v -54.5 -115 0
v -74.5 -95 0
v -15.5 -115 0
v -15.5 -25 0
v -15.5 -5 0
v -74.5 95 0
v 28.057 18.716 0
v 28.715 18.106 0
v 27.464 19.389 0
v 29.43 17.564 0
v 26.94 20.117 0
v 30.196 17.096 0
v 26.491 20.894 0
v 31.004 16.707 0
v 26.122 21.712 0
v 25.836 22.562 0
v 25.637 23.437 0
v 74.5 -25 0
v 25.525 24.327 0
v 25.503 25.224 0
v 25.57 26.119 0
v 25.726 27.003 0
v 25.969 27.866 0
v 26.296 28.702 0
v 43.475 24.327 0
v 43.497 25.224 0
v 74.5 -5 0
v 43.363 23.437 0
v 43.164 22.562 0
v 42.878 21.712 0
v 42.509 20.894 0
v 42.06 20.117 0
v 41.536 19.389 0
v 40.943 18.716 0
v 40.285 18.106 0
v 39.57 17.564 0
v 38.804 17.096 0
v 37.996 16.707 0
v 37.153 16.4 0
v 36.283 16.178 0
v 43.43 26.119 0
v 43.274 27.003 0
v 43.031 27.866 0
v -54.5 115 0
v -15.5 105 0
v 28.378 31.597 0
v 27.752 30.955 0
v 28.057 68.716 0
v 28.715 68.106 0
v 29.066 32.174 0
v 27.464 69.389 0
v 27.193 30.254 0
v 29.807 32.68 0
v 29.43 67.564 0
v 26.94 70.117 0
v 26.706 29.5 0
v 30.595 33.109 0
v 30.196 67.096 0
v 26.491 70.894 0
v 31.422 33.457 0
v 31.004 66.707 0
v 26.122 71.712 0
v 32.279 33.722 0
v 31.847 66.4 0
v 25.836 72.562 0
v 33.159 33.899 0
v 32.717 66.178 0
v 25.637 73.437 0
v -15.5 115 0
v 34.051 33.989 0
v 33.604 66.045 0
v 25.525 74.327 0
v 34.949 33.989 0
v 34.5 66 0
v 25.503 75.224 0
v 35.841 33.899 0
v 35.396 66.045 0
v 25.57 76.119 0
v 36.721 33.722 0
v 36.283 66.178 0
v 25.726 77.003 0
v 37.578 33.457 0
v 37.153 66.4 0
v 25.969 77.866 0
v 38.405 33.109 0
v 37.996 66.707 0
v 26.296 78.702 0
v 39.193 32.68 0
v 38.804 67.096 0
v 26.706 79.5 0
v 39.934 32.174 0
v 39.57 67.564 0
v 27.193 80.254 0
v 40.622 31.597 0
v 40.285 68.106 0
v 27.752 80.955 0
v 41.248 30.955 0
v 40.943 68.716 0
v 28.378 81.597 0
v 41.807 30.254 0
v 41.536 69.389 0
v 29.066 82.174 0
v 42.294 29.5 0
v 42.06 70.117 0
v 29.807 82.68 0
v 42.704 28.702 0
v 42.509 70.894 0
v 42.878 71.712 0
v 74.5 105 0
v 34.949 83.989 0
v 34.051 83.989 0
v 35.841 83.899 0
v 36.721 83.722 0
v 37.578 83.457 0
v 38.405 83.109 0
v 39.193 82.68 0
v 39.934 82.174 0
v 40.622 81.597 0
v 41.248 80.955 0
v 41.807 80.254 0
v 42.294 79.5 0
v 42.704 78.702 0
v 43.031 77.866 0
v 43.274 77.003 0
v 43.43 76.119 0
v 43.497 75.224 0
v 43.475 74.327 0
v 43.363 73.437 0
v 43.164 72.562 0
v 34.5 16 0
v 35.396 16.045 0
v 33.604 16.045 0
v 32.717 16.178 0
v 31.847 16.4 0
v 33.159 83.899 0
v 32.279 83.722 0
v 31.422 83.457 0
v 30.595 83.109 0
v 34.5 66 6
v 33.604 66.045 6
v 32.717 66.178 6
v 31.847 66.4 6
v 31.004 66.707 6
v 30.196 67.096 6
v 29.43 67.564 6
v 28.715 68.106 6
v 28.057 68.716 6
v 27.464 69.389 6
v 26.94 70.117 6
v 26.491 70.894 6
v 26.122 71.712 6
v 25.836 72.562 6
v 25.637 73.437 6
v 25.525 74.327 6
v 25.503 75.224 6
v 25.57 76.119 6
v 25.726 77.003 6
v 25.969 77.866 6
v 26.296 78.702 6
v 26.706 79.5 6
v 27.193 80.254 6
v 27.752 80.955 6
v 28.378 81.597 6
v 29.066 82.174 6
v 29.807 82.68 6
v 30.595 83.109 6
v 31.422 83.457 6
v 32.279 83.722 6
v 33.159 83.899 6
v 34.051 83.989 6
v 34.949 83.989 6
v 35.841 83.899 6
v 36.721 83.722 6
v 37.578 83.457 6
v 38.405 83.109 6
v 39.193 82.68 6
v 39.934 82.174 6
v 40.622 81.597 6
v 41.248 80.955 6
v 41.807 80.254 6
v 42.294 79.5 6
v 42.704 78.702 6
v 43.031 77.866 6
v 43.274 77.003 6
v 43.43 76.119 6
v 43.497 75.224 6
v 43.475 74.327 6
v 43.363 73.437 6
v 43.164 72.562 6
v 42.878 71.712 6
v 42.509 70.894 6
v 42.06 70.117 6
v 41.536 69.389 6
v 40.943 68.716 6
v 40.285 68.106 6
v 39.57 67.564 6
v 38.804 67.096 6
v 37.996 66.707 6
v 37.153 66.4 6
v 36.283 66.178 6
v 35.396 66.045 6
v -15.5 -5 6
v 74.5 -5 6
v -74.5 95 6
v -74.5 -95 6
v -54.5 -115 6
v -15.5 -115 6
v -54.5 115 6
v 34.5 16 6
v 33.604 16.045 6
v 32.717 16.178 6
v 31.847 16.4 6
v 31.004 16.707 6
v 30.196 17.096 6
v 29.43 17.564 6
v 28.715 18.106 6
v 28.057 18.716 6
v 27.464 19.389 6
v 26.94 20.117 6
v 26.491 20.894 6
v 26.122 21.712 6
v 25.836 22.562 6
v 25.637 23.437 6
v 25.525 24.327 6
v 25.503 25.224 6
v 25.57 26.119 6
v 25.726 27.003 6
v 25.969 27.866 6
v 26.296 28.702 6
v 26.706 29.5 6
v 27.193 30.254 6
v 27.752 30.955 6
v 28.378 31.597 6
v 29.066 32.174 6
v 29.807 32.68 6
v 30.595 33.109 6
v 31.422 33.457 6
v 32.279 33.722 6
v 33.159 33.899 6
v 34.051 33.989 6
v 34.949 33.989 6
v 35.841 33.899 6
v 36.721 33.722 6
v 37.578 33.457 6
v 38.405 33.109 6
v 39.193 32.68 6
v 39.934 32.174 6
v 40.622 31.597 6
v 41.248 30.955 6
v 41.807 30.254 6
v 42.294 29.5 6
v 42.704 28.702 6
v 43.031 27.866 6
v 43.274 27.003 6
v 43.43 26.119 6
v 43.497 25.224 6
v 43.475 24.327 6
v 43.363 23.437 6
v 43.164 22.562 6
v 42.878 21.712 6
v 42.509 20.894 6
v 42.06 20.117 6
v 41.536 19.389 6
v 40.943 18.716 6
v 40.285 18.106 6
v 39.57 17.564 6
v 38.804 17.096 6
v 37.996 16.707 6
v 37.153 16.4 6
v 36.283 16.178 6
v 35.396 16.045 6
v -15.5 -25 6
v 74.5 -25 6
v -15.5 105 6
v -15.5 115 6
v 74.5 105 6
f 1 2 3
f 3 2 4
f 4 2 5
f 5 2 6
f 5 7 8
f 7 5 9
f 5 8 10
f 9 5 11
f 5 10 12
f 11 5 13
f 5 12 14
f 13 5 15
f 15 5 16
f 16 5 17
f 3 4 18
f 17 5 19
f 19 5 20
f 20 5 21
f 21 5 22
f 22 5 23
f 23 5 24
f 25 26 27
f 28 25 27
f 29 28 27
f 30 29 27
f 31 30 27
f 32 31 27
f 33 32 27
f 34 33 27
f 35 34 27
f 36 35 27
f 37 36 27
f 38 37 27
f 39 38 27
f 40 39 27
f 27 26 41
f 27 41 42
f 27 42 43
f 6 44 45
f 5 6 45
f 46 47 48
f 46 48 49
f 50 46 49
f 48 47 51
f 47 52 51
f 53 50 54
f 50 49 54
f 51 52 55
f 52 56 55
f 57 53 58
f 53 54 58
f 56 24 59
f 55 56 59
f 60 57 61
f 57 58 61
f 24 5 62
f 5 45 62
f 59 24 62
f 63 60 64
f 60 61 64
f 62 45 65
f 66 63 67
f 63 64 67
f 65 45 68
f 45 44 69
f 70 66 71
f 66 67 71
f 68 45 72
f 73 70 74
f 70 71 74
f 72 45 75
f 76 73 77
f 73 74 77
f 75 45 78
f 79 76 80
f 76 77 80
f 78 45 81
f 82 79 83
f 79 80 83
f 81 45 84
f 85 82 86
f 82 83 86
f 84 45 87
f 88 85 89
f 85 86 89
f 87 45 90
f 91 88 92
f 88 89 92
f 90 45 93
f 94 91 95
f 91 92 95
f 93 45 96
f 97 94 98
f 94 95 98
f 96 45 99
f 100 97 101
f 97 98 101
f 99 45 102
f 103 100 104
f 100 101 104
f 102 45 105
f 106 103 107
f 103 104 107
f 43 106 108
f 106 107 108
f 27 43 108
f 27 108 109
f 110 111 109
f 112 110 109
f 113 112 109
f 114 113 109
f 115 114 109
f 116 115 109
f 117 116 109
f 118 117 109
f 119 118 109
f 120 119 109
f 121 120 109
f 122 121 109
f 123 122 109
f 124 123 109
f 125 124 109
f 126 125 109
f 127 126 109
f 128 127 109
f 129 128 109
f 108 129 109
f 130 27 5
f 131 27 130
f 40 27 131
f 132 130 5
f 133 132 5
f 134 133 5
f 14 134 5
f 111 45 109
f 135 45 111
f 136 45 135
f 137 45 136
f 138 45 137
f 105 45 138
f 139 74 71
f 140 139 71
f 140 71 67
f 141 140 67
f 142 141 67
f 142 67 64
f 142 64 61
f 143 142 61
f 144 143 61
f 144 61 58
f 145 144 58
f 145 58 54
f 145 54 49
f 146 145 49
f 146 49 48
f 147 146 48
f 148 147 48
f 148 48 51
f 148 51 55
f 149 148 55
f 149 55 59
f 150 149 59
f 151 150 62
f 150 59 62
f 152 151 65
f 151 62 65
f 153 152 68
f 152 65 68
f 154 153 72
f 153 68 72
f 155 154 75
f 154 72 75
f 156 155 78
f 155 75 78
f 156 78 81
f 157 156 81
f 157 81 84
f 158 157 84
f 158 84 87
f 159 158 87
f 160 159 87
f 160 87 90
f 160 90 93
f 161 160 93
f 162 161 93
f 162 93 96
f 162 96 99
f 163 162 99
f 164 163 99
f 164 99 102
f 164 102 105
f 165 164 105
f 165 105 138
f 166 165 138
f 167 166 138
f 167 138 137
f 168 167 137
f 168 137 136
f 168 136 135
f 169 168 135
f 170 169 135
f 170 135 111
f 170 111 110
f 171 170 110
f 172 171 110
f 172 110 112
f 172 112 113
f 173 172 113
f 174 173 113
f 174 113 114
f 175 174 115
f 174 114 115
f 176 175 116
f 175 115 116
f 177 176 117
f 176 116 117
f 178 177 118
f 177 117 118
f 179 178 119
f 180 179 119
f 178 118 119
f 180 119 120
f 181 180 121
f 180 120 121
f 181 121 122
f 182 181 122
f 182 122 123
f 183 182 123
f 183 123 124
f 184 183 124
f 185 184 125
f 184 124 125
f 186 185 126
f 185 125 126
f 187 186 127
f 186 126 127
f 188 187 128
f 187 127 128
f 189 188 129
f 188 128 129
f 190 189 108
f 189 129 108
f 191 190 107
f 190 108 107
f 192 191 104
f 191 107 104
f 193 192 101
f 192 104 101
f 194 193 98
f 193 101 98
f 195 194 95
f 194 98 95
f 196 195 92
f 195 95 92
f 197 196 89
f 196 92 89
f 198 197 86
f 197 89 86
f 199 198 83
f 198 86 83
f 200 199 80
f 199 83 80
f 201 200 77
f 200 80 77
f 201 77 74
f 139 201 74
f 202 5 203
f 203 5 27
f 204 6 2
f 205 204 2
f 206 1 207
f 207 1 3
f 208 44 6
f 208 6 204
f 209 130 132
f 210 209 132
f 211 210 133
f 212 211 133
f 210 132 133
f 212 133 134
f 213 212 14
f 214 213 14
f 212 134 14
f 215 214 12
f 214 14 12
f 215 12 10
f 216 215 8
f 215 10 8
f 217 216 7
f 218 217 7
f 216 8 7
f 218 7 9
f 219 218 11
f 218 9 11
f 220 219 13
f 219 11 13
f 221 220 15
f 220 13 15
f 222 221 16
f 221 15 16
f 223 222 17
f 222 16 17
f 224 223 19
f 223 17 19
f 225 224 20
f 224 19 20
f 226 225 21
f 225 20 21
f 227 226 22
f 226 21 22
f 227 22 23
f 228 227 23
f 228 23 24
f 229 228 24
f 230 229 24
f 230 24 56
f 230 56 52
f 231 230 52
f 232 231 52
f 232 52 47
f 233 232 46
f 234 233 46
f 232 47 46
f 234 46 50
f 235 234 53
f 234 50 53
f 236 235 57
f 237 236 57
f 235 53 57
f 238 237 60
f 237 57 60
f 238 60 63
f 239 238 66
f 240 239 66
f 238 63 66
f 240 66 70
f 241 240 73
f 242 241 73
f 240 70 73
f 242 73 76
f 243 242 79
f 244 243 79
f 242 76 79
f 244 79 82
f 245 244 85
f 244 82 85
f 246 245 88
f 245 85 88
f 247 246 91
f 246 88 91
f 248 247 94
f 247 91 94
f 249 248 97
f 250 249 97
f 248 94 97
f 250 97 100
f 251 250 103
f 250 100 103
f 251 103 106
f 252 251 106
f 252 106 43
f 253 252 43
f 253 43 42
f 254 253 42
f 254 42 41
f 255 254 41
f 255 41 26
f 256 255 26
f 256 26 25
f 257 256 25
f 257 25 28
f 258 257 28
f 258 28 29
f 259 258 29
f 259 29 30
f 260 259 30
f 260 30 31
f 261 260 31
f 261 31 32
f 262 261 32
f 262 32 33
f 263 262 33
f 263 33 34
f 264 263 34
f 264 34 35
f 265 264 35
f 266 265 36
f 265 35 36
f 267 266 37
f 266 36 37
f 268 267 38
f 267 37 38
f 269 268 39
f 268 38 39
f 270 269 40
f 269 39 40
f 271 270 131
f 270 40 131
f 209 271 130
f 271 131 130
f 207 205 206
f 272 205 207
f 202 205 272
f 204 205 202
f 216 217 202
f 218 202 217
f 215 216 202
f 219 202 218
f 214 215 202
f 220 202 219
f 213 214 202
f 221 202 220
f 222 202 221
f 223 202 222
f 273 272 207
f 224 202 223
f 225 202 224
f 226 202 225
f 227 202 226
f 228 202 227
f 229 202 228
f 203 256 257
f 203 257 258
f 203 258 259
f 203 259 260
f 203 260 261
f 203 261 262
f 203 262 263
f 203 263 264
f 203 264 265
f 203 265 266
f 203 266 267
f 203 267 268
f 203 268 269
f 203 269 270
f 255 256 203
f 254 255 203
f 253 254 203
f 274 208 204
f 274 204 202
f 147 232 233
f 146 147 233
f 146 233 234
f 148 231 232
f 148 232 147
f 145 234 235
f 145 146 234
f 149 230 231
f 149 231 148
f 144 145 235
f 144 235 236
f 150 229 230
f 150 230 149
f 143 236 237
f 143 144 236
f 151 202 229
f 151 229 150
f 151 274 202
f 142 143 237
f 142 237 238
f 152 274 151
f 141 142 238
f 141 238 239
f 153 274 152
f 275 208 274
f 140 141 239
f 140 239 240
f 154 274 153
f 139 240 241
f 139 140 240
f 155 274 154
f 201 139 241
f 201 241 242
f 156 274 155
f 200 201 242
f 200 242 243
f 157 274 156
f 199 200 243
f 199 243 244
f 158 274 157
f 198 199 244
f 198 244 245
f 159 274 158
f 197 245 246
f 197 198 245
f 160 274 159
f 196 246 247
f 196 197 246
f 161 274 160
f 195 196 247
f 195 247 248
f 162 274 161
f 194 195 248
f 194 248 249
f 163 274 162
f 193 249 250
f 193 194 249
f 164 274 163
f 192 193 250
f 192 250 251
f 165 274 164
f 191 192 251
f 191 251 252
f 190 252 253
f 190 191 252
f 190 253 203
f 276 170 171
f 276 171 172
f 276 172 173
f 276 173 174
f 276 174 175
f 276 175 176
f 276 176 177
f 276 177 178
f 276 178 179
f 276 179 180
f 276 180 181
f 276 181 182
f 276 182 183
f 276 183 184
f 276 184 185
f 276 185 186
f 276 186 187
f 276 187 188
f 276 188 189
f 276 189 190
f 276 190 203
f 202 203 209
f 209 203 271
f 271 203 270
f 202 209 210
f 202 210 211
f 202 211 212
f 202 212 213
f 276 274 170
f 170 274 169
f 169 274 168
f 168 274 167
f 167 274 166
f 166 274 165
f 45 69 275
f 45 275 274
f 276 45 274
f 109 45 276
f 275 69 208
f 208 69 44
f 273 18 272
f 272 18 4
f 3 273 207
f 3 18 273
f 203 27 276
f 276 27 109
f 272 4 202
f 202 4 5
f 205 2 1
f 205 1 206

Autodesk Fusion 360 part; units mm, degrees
sketch "スケッチ1" plane through (0, 0, 0) normal (0, 0, 1) x (1, 0, 0)
  line L0 (-15.5, 115) -> (-74.5, 115)
  line L1 (-74.5, 115) -> (-74.5, -115)
  line L2 (-74.5, -115) -> (-15.5, -115)
  line L3 (74.5, -5) -> (74.5, 105)
  line L4 (68.0217, 105) -> (-74.5, -115) construction
  line L5 (-74.5, 115) -> (39.1174, -60.3826) construction
  line L6 (-15.5, 115) -> (-15.5, 105)
  line L7 (-15.5, 105) -> (74.5, 105)
  line L8 (-74.5, -115) -> (-15.5, -115) construction
  line L9 (74.5, -25) -> (-15.5, -115)
  line L10 (74.5, -25) -> (-15.5, -25)
  line L11 (-15.5, -25) -> (-15.5, -5)
  line L12 (-15.5, -5) -> (74.5, -5)
  dimension "d2" = 230
  dimension "d5" = 59
  dimension "d7" = 90
  dimension "d8" = 20
extrude "押し出し1" add sketch "スケッチ1" along normal blind 6
chamfer "面取り1" distance 20 angle 45 2 edges at (-74.5, -115, 3) (-74.5, 115, 3)
sketch "スケッチ2" plane through (0, 0, 6) normal (0, 0, 1) x (-1, 0, 0)
  line L0 (54.5, -115) -> (74.5, -95)
  line L1 (74.5, -95) -> (74.5, 95)
  line L2 (74.5, 95) -> (54.5, 115)
  line L3 (54.5, 115) -> (15.5, 115)
  line L4 (15.5, 115) -> (-74.5, 25)
  line L5 (-74.5, 25) -> (15.5, 25)
  line L6 (15.5, 25) -> (15.5, 5)
  line L7 (15.5, 5) -> (-74.5, 5)
  line L8 (-74.5, 5) -> (-74.5, -105)
  line L9 (-74.5, -105) -> (15.5, -105)
  line L10 (15.5, -105) -> (15.5, -115)
  line L11 (15.5, -115) -> (54.5, -115)
  line L12 (-74.5, -105) -> (-34.5, -105) construction
  line L13 (-34.5, -105) -> (-34.5, -75) construction
  line L14 (-34.5, -75) -> (-74.5, -75) construction
  line L15 (-74.5, -75) -> (-74.5, -105) construction
  line L16 (-34.5, -75) -> (-34.5, -25) construction
  point P0 (-34.5, -75)
  point P1 (-34.5, -25)
  dimension "d12" = 40
  dimension "d13" = 30
  dimension "d14" = 50
hole "穴1" at (34.5, 25, 6) at (34.5, 75, 6) direction (0, 0, -1) diameter 18 end through all
equation "d5 = 20 mm + 39 mm"
